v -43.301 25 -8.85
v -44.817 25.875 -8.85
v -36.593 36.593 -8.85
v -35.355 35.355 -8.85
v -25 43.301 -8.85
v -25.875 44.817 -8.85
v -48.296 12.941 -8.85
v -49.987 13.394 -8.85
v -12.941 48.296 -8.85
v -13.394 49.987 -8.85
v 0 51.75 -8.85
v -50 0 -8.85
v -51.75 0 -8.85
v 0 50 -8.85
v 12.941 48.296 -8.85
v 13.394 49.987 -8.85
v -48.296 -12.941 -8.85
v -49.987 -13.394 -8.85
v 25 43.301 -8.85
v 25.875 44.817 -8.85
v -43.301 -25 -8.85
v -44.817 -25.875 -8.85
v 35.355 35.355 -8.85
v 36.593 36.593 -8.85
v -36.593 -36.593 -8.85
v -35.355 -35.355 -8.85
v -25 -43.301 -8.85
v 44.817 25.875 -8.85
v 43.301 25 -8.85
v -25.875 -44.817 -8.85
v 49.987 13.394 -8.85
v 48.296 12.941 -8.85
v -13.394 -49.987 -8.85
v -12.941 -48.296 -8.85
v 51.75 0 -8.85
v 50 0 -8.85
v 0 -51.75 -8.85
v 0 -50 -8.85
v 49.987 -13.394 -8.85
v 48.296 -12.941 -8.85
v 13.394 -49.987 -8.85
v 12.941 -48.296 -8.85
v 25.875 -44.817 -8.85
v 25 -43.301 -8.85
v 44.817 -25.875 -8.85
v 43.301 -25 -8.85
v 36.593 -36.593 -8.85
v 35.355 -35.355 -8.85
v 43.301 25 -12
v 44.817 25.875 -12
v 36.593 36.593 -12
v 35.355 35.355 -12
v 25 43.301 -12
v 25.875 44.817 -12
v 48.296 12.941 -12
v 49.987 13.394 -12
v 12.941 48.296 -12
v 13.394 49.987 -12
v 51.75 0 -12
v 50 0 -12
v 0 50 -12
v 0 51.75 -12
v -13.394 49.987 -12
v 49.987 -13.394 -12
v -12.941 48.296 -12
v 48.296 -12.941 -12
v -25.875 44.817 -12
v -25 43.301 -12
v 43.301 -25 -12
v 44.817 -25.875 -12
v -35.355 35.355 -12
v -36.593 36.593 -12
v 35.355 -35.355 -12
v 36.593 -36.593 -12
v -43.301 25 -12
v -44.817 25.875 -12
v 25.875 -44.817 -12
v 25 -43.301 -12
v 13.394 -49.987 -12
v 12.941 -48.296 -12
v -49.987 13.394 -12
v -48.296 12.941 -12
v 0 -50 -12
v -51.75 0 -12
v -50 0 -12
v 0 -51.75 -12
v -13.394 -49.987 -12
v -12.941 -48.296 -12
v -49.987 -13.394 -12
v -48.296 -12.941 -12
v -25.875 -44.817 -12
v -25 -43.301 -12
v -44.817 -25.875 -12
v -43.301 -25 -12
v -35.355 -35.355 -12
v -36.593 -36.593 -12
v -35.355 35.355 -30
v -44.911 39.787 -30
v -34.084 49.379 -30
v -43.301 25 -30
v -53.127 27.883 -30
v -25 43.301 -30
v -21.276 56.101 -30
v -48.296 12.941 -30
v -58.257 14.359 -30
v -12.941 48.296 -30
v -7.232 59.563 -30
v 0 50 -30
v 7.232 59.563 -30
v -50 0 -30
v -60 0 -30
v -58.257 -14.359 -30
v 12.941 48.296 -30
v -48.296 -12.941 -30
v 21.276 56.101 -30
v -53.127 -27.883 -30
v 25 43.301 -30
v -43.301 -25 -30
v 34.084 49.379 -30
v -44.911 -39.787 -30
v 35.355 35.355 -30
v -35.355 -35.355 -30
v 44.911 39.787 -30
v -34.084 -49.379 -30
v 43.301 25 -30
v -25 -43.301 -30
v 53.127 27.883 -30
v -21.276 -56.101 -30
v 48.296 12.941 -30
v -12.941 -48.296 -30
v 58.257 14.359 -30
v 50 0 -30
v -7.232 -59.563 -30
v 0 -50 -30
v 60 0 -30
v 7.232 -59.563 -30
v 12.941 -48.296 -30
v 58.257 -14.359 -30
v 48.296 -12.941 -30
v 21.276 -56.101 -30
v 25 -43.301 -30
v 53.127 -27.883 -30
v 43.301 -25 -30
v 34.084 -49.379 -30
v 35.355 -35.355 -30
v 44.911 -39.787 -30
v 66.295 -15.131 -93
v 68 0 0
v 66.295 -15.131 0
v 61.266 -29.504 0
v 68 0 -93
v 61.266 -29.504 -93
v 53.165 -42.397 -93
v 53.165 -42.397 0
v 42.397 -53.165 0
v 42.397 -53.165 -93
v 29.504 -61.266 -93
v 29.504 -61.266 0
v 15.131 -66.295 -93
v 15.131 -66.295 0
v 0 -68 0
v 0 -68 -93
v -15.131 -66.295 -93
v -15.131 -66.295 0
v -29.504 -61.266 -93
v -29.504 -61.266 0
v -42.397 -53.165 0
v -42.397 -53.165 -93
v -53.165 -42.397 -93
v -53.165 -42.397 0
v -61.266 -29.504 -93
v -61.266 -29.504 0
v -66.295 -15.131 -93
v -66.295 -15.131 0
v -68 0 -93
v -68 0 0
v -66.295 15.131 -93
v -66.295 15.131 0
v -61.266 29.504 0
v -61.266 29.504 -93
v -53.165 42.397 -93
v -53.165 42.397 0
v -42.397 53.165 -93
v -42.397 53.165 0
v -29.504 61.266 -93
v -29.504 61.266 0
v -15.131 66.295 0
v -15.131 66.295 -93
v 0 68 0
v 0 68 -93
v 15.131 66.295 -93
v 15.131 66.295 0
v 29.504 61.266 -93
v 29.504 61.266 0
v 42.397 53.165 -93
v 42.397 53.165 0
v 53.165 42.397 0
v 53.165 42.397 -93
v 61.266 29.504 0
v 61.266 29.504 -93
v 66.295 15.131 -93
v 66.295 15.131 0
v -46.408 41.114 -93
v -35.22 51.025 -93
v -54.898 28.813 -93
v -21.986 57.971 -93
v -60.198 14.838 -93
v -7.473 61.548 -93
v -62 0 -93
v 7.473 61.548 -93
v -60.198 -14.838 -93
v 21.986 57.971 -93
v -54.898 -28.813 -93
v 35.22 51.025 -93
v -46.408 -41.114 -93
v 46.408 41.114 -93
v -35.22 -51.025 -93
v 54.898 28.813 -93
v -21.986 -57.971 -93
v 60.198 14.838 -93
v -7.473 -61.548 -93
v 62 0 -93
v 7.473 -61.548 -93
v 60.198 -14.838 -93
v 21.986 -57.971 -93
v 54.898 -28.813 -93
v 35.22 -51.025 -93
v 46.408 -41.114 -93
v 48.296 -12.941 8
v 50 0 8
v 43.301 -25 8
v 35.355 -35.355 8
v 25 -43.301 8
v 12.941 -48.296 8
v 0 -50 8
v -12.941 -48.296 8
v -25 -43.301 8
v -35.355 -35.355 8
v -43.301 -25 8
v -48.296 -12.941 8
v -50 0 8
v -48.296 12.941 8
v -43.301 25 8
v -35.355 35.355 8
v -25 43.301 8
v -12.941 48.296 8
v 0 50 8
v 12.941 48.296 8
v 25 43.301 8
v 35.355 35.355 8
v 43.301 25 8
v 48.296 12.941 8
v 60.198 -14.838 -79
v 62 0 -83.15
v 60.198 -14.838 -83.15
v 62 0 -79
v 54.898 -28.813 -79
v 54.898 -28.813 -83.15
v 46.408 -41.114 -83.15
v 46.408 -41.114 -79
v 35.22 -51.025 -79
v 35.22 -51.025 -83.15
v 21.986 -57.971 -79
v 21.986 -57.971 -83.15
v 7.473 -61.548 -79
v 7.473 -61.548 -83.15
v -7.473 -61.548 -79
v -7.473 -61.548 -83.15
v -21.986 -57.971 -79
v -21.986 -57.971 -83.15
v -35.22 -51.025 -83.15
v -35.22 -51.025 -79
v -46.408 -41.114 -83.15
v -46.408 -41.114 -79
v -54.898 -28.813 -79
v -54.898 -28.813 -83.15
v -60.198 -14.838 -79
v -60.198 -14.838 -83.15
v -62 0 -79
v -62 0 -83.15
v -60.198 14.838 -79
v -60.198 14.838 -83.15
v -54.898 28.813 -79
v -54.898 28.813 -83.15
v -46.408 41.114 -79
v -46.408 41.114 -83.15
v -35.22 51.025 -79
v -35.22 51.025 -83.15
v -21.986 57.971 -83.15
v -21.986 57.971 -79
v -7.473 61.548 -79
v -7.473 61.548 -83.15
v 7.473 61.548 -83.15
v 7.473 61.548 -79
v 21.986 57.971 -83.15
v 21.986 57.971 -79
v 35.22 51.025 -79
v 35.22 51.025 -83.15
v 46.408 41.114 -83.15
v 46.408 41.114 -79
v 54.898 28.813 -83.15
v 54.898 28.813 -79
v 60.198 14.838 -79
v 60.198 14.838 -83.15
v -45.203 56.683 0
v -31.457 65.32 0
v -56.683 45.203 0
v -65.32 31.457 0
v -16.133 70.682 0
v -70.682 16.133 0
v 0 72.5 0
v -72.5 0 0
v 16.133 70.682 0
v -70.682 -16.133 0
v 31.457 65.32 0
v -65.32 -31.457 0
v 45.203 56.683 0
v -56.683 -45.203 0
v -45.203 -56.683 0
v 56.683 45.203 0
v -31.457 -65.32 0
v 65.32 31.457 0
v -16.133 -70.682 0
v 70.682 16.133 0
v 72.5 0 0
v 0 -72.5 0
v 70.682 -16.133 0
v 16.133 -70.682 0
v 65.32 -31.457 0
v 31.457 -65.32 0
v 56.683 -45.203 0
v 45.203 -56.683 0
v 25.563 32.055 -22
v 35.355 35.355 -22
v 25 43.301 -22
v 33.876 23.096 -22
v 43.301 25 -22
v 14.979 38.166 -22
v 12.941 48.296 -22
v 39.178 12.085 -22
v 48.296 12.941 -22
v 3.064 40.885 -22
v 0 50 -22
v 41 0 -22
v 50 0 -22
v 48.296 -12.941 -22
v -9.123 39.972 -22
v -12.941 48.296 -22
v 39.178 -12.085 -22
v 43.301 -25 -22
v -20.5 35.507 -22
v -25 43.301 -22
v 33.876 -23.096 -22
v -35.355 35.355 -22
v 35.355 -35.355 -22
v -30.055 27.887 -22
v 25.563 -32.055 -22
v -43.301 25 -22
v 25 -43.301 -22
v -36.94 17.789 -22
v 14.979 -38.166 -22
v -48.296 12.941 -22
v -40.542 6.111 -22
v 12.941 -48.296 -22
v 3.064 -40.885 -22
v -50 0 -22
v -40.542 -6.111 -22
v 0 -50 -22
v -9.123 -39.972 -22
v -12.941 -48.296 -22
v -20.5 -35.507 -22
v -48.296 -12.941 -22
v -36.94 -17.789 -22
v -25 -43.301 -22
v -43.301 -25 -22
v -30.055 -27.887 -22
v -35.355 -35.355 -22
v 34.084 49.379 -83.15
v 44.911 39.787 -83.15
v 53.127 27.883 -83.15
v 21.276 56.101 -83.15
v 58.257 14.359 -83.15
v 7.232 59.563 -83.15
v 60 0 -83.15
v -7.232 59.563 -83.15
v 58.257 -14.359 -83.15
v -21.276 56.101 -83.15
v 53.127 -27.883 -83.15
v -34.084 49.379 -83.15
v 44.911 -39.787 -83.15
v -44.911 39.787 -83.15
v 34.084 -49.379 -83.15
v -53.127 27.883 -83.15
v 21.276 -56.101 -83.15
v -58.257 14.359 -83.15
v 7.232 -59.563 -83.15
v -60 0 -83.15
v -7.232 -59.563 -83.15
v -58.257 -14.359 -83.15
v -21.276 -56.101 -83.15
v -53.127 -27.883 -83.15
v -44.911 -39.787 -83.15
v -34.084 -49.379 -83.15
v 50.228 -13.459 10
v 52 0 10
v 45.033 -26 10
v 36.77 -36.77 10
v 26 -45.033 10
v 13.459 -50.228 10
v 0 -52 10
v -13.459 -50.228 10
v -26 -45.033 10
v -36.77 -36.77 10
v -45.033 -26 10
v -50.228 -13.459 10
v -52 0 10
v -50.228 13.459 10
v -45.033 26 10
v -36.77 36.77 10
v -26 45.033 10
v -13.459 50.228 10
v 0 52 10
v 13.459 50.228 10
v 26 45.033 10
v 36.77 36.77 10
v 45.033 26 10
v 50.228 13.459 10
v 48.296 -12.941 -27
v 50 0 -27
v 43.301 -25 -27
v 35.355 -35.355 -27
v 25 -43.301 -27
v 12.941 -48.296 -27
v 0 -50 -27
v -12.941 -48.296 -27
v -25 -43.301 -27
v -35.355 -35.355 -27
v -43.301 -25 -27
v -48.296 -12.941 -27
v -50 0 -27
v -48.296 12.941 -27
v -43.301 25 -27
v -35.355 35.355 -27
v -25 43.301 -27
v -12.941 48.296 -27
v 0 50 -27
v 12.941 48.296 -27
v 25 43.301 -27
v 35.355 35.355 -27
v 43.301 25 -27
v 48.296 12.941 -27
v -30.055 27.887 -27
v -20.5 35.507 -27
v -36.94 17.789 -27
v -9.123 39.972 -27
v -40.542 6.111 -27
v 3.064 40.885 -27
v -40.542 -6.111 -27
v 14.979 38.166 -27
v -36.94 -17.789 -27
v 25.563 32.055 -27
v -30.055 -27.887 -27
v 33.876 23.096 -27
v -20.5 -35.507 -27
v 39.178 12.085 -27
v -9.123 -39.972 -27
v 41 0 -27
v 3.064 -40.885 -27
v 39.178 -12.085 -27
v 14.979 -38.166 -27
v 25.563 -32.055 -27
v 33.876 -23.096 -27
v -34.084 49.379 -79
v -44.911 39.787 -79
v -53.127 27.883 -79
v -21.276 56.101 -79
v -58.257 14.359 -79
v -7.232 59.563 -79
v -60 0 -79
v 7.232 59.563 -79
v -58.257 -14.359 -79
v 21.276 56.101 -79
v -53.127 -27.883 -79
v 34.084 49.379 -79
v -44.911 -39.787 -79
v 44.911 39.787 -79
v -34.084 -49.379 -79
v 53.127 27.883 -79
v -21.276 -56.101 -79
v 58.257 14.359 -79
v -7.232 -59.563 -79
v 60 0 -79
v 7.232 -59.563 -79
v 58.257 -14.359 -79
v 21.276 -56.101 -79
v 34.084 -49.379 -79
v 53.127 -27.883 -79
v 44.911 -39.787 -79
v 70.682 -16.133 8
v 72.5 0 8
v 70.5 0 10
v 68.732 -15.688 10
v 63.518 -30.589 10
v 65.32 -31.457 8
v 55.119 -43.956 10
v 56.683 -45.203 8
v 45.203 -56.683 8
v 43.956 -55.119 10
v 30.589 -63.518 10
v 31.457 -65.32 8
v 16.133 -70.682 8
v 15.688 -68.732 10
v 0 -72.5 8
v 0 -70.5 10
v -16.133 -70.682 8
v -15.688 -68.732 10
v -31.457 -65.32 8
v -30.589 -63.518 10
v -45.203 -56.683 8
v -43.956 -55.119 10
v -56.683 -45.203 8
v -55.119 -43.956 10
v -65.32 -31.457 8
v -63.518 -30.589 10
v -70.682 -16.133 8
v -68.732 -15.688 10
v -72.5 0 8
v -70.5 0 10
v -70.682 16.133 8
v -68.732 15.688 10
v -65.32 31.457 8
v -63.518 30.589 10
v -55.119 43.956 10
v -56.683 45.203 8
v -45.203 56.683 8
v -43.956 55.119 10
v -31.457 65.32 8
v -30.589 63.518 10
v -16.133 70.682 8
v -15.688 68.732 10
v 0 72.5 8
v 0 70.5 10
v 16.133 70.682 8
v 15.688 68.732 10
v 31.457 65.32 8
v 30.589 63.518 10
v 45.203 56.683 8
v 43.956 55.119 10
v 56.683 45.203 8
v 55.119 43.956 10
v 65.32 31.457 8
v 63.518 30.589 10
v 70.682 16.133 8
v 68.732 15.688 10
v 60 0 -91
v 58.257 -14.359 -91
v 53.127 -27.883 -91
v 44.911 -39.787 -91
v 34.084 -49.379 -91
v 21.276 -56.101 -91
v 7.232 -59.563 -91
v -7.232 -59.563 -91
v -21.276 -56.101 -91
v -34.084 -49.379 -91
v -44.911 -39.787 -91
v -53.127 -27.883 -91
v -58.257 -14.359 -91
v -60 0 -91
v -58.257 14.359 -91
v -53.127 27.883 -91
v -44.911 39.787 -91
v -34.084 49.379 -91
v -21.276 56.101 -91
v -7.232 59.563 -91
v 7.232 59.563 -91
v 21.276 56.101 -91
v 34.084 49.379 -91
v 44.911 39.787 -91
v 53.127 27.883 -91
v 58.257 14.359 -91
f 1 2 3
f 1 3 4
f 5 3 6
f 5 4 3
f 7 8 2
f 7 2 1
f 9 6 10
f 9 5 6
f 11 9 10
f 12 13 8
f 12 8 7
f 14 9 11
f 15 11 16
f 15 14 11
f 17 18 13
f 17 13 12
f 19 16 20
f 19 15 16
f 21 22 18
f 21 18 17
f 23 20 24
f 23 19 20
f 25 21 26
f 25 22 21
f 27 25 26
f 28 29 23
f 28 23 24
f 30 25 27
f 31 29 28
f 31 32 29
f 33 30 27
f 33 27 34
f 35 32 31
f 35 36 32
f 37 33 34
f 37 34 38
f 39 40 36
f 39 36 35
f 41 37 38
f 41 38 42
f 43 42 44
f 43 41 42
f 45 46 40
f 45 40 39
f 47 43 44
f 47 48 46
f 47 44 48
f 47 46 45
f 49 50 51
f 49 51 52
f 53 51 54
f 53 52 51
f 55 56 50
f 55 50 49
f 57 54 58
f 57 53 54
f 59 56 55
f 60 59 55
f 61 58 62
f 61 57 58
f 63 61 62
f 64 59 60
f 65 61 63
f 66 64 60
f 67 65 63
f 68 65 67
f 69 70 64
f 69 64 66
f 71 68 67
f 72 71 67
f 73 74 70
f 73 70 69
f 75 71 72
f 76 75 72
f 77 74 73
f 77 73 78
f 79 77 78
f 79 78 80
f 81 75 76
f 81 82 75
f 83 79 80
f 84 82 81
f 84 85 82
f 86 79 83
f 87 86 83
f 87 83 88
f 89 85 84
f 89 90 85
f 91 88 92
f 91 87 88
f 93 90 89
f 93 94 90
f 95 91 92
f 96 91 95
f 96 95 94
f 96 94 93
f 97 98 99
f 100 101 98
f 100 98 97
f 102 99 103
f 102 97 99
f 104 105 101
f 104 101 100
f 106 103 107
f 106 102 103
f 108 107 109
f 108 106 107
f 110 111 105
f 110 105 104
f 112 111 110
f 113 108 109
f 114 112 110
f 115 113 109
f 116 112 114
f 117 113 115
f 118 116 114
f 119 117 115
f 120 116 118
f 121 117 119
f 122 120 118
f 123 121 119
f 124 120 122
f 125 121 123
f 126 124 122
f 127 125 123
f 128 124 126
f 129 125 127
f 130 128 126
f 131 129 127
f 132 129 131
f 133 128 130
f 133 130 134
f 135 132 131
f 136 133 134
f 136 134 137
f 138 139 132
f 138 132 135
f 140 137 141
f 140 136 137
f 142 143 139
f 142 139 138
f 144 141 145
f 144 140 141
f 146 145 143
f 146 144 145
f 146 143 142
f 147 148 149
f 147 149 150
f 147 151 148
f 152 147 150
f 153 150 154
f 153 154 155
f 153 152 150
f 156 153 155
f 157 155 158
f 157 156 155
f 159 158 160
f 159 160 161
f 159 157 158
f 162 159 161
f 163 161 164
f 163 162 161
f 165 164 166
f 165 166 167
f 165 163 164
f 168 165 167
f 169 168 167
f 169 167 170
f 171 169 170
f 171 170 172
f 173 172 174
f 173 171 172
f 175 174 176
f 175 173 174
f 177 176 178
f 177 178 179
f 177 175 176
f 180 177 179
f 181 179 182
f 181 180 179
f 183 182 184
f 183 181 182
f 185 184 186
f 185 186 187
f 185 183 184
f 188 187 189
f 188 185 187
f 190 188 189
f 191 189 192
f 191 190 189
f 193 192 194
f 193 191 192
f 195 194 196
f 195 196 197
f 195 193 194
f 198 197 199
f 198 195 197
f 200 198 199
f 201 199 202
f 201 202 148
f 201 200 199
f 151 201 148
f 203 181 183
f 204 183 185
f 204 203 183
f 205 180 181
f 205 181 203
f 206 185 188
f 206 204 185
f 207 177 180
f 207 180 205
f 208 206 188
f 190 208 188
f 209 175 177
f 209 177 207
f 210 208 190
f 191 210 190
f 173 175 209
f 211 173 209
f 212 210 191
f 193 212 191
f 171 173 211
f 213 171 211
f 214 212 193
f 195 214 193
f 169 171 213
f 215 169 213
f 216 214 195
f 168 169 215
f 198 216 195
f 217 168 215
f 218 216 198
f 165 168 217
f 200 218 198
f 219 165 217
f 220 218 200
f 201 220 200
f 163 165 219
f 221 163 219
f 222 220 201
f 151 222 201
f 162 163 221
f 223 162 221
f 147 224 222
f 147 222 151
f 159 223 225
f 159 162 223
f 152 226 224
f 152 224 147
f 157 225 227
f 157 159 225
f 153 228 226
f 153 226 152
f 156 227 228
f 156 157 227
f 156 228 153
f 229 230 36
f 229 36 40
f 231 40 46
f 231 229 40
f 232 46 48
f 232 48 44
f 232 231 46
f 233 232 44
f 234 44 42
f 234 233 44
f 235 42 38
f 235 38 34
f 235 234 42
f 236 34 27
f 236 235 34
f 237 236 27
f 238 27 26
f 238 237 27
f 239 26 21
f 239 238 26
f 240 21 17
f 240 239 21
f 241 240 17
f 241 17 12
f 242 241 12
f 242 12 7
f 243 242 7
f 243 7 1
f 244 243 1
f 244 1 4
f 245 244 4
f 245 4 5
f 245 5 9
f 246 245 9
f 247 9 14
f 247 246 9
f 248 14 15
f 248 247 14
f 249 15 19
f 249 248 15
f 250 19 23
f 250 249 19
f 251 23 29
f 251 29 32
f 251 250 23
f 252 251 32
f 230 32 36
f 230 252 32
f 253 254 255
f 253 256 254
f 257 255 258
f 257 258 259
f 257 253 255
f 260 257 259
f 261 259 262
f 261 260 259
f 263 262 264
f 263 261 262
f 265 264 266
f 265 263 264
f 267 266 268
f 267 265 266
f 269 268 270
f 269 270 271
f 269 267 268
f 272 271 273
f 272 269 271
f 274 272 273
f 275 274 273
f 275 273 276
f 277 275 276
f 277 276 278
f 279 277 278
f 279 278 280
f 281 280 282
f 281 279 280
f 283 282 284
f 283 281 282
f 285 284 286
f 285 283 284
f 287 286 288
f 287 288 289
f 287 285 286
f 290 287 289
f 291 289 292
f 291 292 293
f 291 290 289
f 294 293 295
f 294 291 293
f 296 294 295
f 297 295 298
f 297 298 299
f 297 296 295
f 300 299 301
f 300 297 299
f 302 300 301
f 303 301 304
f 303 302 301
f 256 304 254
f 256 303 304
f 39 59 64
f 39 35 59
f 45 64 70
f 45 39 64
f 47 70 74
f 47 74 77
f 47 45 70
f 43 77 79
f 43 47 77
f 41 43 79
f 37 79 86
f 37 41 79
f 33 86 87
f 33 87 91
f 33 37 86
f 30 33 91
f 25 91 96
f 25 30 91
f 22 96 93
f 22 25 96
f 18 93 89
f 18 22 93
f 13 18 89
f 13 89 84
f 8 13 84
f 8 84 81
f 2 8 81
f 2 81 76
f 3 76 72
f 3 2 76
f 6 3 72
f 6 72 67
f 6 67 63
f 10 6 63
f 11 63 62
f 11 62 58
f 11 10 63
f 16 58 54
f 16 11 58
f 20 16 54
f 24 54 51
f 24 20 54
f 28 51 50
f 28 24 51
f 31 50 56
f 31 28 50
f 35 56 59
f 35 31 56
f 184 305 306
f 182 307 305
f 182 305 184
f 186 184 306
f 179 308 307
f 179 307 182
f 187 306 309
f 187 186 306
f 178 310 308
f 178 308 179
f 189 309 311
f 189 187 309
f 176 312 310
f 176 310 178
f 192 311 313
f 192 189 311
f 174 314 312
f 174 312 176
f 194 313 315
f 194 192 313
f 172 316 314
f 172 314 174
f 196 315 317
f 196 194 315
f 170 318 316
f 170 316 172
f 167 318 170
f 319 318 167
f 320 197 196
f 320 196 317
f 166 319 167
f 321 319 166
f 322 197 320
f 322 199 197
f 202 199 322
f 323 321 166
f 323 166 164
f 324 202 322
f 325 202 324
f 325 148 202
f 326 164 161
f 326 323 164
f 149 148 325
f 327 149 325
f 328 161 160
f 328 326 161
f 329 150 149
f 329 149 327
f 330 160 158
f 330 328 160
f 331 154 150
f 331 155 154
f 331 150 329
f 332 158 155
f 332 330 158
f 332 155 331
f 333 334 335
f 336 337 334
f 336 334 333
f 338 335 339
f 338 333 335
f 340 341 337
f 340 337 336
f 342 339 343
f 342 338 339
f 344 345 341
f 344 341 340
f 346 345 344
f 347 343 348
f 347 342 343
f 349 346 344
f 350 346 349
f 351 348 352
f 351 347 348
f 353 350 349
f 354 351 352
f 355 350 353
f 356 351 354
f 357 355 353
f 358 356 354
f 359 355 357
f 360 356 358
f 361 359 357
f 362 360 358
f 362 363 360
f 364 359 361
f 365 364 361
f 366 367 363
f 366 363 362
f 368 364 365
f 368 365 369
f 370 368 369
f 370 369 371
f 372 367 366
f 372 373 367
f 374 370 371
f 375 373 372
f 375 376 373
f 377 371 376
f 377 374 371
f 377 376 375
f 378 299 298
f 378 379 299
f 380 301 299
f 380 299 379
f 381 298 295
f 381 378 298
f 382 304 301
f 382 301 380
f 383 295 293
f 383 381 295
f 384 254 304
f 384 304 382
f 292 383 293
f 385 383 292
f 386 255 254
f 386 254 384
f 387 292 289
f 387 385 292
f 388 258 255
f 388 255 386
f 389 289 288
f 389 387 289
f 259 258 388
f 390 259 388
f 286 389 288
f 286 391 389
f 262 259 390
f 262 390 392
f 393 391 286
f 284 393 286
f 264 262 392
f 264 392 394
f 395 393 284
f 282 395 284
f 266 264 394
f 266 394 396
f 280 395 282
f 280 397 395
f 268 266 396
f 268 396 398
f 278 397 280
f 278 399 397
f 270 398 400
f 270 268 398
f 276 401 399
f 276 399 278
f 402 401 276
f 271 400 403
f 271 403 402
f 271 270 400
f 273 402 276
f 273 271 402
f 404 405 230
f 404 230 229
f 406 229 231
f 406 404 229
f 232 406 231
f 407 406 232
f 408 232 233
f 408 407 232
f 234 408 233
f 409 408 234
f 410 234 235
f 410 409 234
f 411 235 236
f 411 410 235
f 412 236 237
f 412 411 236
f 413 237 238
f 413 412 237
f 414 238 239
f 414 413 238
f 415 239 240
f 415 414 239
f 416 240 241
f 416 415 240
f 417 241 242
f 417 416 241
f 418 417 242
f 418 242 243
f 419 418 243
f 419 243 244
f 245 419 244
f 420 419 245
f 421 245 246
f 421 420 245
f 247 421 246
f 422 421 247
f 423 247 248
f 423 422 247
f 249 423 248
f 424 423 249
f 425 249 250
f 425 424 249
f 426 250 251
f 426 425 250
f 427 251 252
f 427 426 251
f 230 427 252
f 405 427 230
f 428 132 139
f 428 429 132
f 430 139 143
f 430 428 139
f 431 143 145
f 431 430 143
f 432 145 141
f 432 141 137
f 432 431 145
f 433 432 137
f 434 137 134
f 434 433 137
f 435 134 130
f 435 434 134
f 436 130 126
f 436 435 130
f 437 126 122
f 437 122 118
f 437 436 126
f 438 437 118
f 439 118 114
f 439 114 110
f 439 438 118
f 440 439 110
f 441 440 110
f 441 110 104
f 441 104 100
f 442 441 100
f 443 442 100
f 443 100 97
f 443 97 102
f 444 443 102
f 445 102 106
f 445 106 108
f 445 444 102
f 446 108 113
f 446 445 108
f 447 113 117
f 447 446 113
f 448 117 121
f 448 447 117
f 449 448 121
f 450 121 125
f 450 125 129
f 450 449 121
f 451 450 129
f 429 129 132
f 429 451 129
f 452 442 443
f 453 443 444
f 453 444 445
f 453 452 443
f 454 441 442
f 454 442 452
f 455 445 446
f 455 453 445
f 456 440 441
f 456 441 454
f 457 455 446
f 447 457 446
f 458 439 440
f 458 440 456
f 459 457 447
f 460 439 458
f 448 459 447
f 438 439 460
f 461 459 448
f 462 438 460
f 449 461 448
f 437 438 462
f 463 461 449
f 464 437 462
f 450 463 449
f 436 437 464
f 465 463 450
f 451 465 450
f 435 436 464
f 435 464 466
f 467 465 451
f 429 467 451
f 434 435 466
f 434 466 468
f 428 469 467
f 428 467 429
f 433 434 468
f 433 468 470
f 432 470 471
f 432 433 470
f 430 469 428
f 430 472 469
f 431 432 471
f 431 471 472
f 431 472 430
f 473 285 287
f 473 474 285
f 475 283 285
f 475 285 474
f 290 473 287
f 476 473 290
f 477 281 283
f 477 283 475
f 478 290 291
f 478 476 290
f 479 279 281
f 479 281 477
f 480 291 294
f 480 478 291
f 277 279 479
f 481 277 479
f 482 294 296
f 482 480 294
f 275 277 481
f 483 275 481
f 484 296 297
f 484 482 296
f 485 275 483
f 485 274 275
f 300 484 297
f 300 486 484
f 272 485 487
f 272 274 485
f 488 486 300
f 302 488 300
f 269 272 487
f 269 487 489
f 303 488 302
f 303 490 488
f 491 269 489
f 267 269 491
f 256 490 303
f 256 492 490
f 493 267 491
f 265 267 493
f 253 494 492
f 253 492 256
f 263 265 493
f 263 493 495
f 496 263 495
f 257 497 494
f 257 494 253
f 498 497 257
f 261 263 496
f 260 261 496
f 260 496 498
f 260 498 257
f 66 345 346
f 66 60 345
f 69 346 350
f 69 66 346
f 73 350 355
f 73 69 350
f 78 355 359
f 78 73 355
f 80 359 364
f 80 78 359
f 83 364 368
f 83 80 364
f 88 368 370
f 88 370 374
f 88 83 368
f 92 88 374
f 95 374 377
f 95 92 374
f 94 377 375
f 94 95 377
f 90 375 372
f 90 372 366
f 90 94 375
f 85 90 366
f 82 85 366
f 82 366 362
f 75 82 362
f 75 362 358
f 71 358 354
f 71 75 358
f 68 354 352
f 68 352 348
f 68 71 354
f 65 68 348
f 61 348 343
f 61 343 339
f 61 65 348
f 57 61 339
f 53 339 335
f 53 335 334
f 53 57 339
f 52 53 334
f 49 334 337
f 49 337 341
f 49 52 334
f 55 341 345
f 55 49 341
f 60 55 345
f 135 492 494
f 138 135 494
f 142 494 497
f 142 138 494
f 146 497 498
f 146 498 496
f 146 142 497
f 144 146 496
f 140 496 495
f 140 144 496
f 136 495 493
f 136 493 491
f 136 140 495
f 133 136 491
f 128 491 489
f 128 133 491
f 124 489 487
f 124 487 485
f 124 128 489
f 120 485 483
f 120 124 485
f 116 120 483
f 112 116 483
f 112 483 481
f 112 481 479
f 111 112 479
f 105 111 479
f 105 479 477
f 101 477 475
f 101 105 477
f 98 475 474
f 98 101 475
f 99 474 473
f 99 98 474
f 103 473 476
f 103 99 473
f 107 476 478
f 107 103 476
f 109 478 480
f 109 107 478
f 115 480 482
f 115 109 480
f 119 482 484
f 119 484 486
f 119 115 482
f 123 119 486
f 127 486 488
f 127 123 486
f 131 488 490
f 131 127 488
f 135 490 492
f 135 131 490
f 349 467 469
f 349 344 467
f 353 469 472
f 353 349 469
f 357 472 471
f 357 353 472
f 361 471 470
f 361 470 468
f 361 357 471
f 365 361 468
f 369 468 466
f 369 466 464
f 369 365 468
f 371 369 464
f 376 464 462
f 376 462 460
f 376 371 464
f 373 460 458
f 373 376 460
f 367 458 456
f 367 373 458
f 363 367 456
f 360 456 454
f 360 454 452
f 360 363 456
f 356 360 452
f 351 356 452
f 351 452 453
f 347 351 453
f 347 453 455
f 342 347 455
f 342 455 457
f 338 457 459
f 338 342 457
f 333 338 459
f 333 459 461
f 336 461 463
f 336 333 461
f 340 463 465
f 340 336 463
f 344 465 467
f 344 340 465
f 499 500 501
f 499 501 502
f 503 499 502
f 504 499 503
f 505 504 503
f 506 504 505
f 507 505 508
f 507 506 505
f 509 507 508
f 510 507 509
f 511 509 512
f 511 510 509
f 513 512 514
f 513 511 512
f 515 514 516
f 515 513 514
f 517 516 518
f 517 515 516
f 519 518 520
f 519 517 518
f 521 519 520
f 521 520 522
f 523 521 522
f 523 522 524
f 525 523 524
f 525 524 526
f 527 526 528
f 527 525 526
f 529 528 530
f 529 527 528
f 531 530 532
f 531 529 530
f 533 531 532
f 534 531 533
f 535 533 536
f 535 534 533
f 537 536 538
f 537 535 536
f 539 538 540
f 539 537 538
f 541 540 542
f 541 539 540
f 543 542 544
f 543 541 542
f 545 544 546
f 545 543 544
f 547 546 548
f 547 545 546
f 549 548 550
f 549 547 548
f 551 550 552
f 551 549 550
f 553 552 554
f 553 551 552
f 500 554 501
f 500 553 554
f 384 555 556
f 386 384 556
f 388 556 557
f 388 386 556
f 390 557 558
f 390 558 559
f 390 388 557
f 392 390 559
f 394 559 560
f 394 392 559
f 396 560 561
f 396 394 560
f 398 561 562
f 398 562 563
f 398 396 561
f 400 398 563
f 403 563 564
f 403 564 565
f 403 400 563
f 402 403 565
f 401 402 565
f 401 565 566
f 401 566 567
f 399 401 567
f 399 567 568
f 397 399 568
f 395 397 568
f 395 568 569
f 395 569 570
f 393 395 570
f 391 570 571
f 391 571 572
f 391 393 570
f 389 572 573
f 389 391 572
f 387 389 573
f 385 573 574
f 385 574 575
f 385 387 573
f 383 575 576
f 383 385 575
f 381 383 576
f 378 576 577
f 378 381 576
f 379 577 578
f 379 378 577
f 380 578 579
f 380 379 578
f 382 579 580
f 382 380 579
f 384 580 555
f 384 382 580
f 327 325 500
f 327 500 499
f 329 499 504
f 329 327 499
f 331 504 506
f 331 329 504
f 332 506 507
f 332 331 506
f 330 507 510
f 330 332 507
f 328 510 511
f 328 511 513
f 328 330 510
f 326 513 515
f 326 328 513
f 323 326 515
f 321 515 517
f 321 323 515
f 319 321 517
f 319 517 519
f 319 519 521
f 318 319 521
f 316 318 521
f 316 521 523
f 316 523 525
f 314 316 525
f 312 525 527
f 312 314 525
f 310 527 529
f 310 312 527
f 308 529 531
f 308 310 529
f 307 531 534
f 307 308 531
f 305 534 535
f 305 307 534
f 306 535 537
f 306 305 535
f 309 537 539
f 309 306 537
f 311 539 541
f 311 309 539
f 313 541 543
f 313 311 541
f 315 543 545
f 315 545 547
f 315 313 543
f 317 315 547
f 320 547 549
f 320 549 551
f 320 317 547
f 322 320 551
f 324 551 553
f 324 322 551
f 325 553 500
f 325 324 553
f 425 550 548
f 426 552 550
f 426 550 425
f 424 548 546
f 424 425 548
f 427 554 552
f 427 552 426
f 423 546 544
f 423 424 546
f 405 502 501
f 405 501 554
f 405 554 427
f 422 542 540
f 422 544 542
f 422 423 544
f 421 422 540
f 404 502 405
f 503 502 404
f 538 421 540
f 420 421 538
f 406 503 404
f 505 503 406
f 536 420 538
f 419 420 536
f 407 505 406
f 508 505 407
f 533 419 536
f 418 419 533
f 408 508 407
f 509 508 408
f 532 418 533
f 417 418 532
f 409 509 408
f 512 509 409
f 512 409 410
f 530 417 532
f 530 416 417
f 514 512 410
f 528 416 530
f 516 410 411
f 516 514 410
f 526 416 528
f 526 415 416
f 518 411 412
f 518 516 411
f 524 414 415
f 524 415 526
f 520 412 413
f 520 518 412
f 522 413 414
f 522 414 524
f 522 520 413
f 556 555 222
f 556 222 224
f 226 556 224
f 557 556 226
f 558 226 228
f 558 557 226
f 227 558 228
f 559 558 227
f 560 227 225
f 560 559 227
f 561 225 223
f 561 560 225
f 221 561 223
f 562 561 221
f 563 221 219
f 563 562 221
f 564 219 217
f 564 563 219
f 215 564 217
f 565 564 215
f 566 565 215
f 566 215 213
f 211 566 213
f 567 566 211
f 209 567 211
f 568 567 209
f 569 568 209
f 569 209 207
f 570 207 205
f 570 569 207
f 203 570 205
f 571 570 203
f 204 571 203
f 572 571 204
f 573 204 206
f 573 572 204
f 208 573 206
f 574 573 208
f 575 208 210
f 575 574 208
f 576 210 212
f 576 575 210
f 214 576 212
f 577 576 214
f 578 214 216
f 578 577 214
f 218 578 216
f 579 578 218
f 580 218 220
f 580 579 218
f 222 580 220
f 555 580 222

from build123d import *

# Parameters (mm, degrees)
CHAMFER_2_SIZE = 2


with BuildPart() as part:
    # Эскиз1 → Повернуть1 (revolve)
    with BuildSketch(Plane(origin=(0, 0, 0), x_dir=(0, 0, -1), z_dir=(1, 0, 0)), mode=Mode.PRIVATE) as revolve_1_sk:
        Polygon((8.85, 50), (-10, 50), (-10, 72.5), (0, 72.5), (0, 68), (93, 68), (93, 60), (83.15, 60), (83.15, 62), (79, 62), (79, 60), (30, 60), (30, 50), (27, 50), (27, 41), (22, 41), (22, 50), (12, 50), (12, 51.75), (8.85, 51.75), align=None)
    revolve(revolve_1_sk.sketch.rotate(Axis((0, 0, 0), (0, 0, -1)), 90), axis=Axis((0, 0, 0), (0, 0, -1)))

    # Фаска2
    chamfer_2_edges = [part.edges().sort_by_distance(p)[0] for p in [
        (-60, 0, -93),
        (-50, 0, 10),
        (-72.5, 0, 10),
    ]]
    chamfer(chamfer_2_edges, length=CHAMFER_2_SIZE)


solid = part.part
